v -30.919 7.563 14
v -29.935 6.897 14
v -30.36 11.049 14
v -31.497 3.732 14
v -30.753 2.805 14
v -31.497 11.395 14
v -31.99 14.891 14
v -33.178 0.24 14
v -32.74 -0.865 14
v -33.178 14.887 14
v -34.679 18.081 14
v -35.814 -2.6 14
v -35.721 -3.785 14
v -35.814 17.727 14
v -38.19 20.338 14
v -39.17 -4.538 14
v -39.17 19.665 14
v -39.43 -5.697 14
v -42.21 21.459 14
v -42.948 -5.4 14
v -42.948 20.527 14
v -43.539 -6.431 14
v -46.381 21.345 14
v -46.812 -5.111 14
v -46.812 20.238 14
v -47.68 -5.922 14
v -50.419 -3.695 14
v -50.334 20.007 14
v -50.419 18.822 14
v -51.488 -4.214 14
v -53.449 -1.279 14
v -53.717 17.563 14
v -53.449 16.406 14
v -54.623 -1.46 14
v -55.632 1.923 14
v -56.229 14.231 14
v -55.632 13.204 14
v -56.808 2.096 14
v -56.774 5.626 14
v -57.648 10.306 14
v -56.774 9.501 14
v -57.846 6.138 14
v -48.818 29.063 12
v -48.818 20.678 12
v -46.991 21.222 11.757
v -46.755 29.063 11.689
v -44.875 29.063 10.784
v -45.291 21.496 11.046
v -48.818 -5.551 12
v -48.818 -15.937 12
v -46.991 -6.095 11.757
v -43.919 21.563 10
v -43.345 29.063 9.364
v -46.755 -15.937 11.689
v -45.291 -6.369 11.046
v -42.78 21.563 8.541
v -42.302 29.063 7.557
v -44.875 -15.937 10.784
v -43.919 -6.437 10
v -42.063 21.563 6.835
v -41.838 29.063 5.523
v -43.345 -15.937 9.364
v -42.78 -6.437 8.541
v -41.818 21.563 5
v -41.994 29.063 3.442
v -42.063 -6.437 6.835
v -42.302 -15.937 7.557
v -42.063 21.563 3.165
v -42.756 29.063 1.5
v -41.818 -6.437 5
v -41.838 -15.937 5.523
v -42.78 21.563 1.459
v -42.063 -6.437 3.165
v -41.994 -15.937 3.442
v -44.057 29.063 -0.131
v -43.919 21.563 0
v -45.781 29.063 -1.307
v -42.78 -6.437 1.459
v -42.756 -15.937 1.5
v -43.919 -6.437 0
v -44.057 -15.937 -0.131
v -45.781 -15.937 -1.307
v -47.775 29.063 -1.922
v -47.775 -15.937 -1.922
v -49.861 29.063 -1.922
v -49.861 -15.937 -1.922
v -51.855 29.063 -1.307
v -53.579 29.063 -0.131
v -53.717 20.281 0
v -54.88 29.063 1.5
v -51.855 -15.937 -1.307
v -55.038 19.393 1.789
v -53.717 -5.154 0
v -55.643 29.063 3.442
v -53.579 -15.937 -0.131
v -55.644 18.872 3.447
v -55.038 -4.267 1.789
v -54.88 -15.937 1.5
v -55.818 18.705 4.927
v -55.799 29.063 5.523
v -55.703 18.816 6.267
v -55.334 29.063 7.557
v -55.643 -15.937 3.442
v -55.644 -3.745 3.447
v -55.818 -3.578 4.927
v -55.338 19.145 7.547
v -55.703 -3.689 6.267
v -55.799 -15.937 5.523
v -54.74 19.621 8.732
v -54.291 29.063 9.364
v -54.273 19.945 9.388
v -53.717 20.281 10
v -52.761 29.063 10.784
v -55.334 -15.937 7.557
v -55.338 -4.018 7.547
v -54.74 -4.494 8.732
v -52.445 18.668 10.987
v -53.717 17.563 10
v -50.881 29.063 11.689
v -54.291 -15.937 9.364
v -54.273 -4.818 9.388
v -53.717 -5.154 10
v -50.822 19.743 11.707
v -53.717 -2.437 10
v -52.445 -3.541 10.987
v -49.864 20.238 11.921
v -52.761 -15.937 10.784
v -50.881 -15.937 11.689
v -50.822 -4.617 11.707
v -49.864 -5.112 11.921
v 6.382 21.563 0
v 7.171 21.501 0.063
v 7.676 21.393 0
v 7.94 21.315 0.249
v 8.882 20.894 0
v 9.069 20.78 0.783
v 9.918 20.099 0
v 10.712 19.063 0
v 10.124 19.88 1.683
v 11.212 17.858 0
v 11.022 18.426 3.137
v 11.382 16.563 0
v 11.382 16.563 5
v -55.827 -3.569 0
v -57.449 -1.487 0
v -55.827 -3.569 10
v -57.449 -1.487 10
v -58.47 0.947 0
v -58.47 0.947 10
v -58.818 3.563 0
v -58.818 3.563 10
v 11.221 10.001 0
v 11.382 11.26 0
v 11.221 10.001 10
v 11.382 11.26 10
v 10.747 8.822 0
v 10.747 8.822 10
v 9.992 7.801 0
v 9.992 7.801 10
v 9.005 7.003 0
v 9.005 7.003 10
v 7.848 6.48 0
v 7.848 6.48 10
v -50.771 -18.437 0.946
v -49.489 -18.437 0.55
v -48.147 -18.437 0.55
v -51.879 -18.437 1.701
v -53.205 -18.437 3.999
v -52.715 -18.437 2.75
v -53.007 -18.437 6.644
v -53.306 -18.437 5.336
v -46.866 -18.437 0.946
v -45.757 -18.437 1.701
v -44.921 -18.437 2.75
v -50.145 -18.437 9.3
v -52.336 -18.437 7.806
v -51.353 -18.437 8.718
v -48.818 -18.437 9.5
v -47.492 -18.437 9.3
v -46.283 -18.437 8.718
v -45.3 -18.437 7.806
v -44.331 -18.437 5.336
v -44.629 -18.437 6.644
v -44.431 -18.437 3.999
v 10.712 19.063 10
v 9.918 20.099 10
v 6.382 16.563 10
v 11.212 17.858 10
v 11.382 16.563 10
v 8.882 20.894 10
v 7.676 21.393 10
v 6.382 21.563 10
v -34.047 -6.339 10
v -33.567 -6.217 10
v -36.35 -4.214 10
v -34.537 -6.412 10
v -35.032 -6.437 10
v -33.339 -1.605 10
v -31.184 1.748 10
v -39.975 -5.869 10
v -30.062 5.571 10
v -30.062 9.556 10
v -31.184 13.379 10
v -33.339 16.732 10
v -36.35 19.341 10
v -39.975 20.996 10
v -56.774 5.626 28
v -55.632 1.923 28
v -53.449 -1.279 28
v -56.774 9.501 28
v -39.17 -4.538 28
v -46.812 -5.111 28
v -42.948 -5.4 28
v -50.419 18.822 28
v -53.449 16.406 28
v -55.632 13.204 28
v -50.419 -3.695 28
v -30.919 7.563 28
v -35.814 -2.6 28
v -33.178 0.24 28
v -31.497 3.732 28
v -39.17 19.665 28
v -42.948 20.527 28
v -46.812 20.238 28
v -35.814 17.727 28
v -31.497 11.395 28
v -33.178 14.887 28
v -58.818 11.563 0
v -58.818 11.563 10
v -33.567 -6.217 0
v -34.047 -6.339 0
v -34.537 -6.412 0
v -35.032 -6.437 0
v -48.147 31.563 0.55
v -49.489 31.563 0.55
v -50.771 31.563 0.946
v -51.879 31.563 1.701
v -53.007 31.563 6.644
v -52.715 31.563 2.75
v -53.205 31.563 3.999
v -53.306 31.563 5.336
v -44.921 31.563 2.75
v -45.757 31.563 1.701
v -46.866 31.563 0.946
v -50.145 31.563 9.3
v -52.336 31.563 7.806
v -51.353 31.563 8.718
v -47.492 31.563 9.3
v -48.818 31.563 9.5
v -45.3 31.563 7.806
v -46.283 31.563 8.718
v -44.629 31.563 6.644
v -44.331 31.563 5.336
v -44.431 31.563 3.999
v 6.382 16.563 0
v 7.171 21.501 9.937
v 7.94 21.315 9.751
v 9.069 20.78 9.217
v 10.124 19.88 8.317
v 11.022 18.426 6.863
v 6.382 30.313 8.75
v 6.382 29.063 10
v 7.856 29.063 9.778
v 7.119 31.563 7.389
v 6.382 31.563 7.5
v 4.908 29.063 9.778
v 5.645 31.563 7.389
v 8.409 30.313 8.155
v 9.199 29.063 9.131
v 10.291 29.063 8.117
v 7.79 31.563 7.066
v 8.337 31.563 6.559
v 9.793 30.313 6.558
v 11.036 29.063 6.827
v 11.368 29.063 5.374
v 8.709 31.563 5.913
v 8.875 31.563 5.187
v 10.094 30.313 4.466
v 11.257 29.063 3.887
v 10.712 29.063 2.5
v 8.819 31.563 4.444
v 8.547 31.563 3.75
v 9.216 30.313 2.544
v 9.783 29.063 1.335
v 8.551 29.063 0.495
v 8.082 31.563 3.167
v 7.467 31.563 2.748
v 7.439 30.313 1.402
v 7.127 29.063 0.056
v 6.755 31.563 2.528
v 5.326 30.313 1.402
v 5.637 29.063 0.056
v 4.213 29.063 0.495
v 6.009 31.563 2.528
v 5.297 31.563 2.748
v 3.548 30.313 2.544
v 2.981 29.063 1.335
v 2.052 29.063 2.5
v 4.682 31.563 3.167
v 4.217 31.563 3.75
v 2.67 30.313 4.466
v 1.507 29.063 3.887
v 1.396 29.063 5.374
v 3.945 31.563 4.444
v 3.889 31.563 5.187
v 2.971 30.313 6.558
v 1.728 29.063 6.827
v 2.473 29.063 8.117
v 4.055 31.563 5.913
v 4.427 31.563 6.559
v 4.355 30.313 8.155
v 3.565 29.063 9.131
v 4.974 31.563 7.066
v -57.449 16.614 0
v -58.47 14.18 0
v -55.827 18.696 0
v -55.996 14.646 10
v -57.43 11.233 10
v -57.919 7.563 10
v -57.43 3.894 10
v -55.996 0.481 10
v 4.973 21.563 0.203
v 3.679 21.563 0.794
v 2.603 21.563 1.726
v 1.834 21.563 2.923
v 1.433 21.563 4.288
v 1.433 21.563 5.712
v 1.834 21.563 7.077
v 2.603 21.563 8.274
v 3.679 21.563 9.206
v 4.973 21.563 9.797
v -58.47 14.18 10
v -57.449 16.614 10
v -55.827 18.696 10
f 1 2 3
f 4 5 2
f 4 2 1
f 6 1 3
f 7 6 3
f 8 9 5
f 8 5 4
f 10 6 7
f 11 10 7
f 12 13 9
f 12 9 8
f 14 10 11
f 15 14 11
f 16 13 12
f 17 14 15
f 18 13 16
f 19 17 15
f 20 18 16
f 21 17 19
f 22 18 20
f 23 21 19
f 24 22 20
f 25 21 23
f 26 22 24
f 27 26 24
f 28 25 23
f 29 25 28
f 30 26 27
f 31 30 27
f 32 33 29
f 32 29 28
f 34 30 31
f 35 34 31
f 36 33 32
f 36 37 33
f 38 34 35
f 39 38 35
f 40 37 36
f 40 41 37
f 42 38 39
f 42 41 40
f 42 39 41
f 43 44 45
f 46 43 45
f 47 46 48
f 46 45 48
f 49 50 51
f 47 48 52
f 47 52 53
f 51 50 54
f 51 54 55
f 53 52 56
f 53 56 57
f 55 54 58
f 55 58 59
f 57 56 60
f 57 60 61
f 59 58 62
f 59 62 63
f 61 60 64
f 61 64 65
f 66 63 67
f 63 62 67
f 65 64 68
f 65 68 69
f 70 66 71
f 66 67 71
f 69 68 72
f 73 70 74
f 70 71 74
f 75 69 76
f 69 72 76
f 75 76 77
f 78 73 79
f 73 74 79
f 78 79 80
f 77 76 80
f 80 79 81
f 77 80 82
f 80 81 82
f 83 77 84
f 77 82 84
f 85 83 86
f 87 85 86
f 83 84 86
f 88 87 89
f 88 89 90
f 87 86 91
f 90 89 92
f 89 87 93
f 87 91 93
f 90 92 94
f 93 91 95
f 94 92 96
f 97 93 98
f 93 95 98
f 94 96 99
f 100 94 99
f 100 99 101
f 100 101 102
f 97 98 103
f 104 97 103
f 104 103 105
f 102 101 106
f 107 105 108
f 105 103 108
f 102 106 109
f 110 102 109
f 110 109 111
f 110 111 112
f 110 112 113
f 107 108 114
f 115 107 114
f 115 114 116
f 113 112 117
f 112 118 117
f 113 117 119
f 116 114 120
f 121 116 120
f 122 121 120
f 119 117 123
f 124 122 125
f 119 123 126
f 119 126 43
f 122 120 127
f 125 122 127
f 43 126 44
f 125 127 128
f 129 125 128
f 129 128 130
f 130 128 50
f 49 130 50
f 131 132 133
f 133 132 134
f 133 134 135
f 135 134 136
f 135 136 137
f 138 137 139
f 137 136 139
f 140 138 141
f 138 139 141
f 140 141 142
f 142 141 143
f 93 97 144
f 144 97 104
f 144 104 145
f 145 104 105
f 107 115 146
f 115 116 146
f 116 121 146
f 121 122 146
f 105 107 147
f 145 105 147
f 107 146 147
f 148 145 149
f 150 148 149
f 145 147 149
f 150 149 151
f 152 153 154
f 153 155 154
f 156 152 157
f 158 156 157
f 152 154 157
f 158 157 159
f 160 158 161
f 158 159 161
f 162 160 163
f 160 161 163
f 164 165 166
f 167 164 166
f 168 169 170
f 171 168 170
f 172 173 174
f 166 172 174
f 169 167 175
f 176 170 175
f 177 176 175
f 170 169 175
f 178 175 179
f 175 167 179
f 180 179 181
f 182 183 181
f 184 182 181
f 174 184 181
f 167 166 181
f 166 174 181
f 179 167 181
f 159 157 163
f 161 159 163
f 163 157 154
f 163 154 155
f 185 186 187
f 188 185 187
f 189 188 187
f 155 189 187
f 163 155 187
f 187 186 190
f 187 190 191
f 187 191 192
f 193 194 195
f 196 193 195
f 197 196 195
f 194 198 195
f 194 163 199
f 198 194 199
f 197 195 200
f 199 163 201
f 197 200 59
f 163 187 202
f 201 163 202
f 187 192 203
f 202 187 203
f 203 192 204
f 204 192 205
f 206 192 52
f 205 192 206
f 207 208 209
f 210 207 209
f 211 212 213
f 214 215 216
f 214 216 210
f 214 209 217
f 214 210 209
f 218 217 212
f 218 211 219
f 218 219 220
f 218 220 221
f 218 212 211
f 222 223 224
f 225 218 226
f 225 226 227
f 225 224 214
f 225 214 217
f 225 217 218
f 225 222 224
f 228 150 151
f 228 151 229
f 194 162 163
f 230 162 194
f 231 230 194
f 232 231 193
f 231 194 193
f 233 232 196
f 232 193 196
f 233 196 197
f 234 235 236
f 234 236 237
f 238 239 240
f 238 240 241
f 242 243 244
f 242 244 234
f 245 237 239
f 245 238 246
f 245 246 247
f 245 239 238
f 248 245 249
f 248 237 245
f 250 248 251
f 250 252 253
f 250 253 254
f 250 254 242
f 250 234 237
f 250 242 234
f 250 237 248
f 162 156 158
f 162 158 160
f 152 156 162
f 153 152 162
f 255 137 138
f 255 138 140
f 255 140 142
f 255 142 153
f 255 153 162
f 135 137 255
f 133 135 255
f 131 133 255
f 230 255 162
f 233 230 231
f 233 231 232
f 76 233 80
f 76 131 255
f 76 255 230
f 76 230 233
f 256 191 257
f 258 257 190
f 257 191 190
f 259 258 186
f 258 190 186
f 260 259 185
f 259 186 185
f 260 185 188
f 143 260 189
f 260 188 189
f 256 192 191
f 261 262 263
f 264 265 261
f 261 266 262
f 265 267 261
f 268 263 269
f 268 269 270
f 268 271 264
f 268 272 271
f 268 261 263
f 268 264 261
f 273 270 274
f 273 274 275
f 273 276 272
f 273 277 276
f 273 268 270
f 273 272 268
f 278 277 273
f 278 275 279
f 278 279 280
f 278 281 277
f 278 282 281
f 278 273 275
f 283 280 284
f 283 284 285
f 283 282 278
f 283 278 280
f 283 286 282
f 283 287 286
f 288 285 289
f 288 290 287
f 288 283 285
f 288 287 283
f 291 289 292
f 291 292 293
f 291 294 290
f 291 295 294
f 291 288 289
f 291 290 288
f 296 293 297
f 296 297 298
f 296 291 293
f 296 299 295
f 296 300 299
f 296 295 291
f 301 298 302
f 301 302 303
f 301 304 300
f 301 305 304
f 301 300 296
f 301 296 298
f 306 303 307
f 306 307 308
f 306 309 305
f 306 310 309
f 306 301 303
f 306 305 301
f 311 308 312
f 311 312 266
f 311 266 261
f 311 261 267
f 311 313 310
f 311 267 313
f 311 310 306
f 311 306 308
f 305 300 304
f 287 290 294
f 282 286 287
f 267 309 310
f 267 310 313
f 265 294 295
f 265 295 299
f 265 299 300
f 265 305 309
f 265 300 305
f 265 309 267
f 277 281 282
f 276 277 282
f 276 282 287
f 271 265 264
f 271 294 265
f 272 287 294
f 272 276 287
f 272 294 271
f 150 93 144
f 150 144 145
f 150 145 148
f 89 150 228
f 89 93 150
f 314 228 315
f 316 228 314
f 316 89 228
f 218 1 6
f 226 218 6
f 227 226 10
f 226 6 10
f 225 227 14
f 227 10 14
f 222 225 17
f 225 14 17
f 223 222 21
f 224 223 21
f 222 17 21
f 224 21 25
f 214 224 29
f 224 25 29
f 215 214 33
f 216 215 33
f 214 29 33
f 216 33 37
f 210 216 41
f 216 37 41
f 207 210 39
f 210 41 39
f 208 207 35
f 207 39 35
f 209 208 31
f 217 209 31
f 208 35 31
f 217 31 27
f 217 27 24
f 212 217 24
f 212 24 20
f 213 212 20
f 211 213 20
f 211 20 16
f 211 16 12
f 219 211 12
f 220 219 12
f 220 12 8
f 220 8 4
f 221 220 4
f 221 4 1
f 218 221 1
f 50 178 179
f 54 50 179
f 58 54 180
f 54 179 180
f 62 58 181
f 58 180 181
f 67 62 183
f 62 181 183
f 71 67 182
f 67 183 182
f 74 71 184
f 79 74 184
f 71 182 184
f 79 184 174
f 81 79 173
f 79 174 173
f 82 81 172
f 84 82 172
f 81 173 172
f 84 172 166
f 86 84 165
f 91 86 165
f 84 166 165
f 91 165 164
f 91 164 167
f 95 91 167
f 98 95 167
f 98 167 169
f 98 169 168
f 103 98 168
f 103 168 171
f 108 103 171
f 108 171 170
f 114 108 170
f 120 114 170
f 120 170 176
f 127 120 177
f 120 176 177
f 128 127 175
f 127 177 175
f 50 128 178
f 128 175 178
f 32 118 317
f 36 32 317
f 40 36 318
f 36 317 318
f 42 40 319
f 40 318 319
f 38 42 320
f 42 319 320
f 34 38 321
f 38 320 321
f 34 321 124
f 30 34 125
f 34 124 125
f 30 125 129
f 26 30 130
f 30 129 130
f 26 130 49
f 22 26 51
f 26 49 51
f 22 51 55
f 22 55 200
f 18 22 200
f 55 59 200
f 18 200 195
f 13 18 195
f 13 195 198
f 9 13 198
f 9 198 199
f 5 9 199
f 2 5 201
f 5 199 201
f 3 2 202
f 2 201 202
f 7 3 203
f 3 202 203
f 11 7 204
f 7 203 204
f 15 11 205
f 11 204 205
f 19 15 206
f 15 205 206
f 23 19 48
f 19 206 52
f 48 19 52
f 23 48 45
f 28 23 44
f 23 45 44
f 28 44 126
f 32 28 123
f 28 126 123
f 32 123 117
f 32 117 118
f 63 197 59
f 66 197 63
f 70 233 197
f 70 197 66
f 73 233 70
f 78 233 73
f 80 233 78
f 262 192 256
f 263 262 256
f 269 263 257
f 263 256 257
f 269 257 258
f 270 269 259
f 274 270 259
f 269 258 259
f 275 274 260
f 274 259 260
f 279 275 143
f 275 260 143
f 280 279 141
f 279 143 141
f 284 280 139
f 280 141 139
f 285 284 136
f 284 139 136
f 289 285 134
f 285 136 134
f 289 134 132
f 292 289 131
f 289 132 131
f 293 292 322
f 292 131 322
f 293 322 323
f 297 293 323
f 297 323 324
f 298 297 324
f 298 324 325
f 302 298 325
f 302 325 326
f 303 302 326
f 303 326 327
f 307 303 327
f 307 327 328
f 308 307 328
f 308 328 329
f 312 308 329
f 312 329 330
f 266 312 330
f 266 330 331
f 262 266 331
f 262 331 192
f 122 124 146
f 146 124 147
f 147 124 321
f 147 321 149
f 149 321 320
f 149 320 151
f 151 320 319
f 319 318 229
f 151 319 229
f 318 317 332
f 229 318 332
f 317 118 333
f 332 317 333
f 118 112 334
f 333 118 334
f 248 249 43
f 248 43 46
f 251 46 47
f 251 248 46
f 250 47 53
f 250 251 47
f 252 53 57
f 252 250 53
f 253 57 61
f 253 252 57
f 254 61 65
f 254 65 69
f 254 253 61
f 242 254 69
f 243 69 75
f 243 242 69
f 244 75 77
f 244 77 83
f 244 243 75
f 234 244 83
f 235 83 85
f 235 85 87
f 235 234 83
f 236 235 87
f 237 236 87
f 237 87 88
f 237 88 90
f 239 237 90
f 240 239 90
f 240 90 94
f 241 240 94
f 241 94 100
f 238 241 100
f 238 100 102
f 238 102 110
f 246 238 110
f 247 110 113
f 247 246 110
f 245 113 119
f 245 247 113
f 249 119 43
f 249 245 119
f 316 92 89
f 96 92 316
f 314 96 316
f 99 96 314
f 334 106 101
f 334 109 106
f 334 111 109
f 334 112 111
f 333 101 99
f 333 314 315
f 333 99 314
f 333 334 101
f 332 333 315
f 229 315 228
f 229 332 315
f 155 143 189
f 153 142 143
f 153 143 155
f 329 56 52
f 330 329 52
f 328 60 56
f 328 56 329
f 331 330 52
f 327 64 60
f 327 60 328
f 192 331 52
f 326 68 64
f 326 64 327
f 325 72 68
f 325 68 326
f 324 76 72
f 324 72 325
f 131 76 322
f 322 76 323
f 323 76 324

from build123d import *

# Parameters (mm, degrees)
BOSS_EXTRUDE1_DEPTH      = 10
FILLET1_R                = 10
FILLET2_R                = 5
BOSS_EXTRUDE2_DEPTH      = 10
BOSS_EXTRUDE2_DEPTH_BACK = 40
SKETCH2_R                = 7
BOSS_EXTRUDE3_START      = -5
SKETCH3_R                = 5
BOSS_EXTRUDE3_DEPTH      = 15
CHAMFER1_SIZE            = 2.5
BOSS_EXTRUDE4_DEPTH      = 18
BOSS_EXTRUDE4_DEPTH_BACK = 10
SKETCH4_R                = 13
SKETCH5_R                = 14
BOSS_EXTRUDE5_DEPTH      = 4


with BuildPart() as part:
    # Sketch1 → Boss-Extrude1 (new body)
    with BuildSketch(Plane.XY):
        Polygon((-58.818184361, 21.563458262), (11.382033939, 21.563458262), (11.382033939, 7.563458262), (-34.282866194, -6.436541738), (-58.818184361, -6.436541738), align=None)
    extrude(amount=BOSS_EXTRUDE1_DEPTH)

    # Fillet1
    fillet1_edges = [part.edges().sort_by_distance(p)[0] for p in [
        (-58.818184361, 21.563458262, 5),
        (-58.818184361, -6.436541738, 5),
    ]]
    fillet(fillet1_edges, radius=FILLET1_R)

    # Fillet2
    fillet2_edges = [part.edges().sort_by_distance(p)[0] for p in [
        (11.382033939, 21.563458262, 5),
        (11.382033939, 7.563458262, 5),
        (-34.282866194, -6.436541738, 5),
    ]]
    fillet(fillet2_edges, radius=FILLET2_R)

    # Sketch2 → Boss-Extrude2 (add, two sides: drawn at the far end of the back side and taken through both)
    with BuildSketch(Plane(origin=(0, 21.563458262, 0), x_dir=(1, 0, 0), z_dir=(0, 1, 0)).offset(-BOSS_EXTRUDE2_DEPTH_BACK)):
        with Locations(Location((-48.818184361, -5, 0), (0, 0, 270))):
            Circle(SKETCH2_R)
    extrude(amount=BOSS_EXTRUDE2_DEPTH + BOSS_EXTRUDE2_DEPTH_BACK)

    # Sketch3 → Boss-Extrude3 (add)
    with BuildSketch(Plane(origin=(0, 21.563458262, 0), x_dir=(1, 0, 0), z_dir=(0, 1, 0)).offset(BOSS_EXTRUDE3_START)):
        with Locations(Location((6.382033939, -5, 0), (0, 0, 270))):
            Circle(SKETCH3_R)
    extrude(amount=BOSS_EXTRUDE3_DEPTH)

    # Chamfer1
    chamfer1_edges = [part.edges().sort_by_distance(p)[0] for p in [
        (-48.818184361, -18.436541738, -2),
        (-48.818184361, 31.563458262, -2),
        (6.382033939, 31.563458262, 0),
    ]]
    chamfer(chamfer1_edges, length=CHAMFER1_SIZE)

    # Sketch4 → Boss-Extrude4 (add, two sides: drawn at the far end of the back side and taken through both)
    with BuildSketch(Plane.XY.offset(10).offset(-BOSS_EXTRUDE4_DEPTH_BACK)):
        with Locations((-43.919204876, 7.563458262)):
            Circle(SKETCH4_R)
    extrude(amount=BOSS_EXTRUDE4_DEPTH + BOSS_EXTRUDE4_DEPTH_BACK)

    # Sketch5 → Boss-Extrude5 (add)
    with BuildSketch(Plane.XY.offset(10)):
        with Locations(Location((-43.919204876, 7.563458262, 0), (0, 0, 134.415308597))):
            Circle(SKETCH5_R)
    extrude(amount=BOSS_EXTRUDE5_DEPTH)


solid = part.part
